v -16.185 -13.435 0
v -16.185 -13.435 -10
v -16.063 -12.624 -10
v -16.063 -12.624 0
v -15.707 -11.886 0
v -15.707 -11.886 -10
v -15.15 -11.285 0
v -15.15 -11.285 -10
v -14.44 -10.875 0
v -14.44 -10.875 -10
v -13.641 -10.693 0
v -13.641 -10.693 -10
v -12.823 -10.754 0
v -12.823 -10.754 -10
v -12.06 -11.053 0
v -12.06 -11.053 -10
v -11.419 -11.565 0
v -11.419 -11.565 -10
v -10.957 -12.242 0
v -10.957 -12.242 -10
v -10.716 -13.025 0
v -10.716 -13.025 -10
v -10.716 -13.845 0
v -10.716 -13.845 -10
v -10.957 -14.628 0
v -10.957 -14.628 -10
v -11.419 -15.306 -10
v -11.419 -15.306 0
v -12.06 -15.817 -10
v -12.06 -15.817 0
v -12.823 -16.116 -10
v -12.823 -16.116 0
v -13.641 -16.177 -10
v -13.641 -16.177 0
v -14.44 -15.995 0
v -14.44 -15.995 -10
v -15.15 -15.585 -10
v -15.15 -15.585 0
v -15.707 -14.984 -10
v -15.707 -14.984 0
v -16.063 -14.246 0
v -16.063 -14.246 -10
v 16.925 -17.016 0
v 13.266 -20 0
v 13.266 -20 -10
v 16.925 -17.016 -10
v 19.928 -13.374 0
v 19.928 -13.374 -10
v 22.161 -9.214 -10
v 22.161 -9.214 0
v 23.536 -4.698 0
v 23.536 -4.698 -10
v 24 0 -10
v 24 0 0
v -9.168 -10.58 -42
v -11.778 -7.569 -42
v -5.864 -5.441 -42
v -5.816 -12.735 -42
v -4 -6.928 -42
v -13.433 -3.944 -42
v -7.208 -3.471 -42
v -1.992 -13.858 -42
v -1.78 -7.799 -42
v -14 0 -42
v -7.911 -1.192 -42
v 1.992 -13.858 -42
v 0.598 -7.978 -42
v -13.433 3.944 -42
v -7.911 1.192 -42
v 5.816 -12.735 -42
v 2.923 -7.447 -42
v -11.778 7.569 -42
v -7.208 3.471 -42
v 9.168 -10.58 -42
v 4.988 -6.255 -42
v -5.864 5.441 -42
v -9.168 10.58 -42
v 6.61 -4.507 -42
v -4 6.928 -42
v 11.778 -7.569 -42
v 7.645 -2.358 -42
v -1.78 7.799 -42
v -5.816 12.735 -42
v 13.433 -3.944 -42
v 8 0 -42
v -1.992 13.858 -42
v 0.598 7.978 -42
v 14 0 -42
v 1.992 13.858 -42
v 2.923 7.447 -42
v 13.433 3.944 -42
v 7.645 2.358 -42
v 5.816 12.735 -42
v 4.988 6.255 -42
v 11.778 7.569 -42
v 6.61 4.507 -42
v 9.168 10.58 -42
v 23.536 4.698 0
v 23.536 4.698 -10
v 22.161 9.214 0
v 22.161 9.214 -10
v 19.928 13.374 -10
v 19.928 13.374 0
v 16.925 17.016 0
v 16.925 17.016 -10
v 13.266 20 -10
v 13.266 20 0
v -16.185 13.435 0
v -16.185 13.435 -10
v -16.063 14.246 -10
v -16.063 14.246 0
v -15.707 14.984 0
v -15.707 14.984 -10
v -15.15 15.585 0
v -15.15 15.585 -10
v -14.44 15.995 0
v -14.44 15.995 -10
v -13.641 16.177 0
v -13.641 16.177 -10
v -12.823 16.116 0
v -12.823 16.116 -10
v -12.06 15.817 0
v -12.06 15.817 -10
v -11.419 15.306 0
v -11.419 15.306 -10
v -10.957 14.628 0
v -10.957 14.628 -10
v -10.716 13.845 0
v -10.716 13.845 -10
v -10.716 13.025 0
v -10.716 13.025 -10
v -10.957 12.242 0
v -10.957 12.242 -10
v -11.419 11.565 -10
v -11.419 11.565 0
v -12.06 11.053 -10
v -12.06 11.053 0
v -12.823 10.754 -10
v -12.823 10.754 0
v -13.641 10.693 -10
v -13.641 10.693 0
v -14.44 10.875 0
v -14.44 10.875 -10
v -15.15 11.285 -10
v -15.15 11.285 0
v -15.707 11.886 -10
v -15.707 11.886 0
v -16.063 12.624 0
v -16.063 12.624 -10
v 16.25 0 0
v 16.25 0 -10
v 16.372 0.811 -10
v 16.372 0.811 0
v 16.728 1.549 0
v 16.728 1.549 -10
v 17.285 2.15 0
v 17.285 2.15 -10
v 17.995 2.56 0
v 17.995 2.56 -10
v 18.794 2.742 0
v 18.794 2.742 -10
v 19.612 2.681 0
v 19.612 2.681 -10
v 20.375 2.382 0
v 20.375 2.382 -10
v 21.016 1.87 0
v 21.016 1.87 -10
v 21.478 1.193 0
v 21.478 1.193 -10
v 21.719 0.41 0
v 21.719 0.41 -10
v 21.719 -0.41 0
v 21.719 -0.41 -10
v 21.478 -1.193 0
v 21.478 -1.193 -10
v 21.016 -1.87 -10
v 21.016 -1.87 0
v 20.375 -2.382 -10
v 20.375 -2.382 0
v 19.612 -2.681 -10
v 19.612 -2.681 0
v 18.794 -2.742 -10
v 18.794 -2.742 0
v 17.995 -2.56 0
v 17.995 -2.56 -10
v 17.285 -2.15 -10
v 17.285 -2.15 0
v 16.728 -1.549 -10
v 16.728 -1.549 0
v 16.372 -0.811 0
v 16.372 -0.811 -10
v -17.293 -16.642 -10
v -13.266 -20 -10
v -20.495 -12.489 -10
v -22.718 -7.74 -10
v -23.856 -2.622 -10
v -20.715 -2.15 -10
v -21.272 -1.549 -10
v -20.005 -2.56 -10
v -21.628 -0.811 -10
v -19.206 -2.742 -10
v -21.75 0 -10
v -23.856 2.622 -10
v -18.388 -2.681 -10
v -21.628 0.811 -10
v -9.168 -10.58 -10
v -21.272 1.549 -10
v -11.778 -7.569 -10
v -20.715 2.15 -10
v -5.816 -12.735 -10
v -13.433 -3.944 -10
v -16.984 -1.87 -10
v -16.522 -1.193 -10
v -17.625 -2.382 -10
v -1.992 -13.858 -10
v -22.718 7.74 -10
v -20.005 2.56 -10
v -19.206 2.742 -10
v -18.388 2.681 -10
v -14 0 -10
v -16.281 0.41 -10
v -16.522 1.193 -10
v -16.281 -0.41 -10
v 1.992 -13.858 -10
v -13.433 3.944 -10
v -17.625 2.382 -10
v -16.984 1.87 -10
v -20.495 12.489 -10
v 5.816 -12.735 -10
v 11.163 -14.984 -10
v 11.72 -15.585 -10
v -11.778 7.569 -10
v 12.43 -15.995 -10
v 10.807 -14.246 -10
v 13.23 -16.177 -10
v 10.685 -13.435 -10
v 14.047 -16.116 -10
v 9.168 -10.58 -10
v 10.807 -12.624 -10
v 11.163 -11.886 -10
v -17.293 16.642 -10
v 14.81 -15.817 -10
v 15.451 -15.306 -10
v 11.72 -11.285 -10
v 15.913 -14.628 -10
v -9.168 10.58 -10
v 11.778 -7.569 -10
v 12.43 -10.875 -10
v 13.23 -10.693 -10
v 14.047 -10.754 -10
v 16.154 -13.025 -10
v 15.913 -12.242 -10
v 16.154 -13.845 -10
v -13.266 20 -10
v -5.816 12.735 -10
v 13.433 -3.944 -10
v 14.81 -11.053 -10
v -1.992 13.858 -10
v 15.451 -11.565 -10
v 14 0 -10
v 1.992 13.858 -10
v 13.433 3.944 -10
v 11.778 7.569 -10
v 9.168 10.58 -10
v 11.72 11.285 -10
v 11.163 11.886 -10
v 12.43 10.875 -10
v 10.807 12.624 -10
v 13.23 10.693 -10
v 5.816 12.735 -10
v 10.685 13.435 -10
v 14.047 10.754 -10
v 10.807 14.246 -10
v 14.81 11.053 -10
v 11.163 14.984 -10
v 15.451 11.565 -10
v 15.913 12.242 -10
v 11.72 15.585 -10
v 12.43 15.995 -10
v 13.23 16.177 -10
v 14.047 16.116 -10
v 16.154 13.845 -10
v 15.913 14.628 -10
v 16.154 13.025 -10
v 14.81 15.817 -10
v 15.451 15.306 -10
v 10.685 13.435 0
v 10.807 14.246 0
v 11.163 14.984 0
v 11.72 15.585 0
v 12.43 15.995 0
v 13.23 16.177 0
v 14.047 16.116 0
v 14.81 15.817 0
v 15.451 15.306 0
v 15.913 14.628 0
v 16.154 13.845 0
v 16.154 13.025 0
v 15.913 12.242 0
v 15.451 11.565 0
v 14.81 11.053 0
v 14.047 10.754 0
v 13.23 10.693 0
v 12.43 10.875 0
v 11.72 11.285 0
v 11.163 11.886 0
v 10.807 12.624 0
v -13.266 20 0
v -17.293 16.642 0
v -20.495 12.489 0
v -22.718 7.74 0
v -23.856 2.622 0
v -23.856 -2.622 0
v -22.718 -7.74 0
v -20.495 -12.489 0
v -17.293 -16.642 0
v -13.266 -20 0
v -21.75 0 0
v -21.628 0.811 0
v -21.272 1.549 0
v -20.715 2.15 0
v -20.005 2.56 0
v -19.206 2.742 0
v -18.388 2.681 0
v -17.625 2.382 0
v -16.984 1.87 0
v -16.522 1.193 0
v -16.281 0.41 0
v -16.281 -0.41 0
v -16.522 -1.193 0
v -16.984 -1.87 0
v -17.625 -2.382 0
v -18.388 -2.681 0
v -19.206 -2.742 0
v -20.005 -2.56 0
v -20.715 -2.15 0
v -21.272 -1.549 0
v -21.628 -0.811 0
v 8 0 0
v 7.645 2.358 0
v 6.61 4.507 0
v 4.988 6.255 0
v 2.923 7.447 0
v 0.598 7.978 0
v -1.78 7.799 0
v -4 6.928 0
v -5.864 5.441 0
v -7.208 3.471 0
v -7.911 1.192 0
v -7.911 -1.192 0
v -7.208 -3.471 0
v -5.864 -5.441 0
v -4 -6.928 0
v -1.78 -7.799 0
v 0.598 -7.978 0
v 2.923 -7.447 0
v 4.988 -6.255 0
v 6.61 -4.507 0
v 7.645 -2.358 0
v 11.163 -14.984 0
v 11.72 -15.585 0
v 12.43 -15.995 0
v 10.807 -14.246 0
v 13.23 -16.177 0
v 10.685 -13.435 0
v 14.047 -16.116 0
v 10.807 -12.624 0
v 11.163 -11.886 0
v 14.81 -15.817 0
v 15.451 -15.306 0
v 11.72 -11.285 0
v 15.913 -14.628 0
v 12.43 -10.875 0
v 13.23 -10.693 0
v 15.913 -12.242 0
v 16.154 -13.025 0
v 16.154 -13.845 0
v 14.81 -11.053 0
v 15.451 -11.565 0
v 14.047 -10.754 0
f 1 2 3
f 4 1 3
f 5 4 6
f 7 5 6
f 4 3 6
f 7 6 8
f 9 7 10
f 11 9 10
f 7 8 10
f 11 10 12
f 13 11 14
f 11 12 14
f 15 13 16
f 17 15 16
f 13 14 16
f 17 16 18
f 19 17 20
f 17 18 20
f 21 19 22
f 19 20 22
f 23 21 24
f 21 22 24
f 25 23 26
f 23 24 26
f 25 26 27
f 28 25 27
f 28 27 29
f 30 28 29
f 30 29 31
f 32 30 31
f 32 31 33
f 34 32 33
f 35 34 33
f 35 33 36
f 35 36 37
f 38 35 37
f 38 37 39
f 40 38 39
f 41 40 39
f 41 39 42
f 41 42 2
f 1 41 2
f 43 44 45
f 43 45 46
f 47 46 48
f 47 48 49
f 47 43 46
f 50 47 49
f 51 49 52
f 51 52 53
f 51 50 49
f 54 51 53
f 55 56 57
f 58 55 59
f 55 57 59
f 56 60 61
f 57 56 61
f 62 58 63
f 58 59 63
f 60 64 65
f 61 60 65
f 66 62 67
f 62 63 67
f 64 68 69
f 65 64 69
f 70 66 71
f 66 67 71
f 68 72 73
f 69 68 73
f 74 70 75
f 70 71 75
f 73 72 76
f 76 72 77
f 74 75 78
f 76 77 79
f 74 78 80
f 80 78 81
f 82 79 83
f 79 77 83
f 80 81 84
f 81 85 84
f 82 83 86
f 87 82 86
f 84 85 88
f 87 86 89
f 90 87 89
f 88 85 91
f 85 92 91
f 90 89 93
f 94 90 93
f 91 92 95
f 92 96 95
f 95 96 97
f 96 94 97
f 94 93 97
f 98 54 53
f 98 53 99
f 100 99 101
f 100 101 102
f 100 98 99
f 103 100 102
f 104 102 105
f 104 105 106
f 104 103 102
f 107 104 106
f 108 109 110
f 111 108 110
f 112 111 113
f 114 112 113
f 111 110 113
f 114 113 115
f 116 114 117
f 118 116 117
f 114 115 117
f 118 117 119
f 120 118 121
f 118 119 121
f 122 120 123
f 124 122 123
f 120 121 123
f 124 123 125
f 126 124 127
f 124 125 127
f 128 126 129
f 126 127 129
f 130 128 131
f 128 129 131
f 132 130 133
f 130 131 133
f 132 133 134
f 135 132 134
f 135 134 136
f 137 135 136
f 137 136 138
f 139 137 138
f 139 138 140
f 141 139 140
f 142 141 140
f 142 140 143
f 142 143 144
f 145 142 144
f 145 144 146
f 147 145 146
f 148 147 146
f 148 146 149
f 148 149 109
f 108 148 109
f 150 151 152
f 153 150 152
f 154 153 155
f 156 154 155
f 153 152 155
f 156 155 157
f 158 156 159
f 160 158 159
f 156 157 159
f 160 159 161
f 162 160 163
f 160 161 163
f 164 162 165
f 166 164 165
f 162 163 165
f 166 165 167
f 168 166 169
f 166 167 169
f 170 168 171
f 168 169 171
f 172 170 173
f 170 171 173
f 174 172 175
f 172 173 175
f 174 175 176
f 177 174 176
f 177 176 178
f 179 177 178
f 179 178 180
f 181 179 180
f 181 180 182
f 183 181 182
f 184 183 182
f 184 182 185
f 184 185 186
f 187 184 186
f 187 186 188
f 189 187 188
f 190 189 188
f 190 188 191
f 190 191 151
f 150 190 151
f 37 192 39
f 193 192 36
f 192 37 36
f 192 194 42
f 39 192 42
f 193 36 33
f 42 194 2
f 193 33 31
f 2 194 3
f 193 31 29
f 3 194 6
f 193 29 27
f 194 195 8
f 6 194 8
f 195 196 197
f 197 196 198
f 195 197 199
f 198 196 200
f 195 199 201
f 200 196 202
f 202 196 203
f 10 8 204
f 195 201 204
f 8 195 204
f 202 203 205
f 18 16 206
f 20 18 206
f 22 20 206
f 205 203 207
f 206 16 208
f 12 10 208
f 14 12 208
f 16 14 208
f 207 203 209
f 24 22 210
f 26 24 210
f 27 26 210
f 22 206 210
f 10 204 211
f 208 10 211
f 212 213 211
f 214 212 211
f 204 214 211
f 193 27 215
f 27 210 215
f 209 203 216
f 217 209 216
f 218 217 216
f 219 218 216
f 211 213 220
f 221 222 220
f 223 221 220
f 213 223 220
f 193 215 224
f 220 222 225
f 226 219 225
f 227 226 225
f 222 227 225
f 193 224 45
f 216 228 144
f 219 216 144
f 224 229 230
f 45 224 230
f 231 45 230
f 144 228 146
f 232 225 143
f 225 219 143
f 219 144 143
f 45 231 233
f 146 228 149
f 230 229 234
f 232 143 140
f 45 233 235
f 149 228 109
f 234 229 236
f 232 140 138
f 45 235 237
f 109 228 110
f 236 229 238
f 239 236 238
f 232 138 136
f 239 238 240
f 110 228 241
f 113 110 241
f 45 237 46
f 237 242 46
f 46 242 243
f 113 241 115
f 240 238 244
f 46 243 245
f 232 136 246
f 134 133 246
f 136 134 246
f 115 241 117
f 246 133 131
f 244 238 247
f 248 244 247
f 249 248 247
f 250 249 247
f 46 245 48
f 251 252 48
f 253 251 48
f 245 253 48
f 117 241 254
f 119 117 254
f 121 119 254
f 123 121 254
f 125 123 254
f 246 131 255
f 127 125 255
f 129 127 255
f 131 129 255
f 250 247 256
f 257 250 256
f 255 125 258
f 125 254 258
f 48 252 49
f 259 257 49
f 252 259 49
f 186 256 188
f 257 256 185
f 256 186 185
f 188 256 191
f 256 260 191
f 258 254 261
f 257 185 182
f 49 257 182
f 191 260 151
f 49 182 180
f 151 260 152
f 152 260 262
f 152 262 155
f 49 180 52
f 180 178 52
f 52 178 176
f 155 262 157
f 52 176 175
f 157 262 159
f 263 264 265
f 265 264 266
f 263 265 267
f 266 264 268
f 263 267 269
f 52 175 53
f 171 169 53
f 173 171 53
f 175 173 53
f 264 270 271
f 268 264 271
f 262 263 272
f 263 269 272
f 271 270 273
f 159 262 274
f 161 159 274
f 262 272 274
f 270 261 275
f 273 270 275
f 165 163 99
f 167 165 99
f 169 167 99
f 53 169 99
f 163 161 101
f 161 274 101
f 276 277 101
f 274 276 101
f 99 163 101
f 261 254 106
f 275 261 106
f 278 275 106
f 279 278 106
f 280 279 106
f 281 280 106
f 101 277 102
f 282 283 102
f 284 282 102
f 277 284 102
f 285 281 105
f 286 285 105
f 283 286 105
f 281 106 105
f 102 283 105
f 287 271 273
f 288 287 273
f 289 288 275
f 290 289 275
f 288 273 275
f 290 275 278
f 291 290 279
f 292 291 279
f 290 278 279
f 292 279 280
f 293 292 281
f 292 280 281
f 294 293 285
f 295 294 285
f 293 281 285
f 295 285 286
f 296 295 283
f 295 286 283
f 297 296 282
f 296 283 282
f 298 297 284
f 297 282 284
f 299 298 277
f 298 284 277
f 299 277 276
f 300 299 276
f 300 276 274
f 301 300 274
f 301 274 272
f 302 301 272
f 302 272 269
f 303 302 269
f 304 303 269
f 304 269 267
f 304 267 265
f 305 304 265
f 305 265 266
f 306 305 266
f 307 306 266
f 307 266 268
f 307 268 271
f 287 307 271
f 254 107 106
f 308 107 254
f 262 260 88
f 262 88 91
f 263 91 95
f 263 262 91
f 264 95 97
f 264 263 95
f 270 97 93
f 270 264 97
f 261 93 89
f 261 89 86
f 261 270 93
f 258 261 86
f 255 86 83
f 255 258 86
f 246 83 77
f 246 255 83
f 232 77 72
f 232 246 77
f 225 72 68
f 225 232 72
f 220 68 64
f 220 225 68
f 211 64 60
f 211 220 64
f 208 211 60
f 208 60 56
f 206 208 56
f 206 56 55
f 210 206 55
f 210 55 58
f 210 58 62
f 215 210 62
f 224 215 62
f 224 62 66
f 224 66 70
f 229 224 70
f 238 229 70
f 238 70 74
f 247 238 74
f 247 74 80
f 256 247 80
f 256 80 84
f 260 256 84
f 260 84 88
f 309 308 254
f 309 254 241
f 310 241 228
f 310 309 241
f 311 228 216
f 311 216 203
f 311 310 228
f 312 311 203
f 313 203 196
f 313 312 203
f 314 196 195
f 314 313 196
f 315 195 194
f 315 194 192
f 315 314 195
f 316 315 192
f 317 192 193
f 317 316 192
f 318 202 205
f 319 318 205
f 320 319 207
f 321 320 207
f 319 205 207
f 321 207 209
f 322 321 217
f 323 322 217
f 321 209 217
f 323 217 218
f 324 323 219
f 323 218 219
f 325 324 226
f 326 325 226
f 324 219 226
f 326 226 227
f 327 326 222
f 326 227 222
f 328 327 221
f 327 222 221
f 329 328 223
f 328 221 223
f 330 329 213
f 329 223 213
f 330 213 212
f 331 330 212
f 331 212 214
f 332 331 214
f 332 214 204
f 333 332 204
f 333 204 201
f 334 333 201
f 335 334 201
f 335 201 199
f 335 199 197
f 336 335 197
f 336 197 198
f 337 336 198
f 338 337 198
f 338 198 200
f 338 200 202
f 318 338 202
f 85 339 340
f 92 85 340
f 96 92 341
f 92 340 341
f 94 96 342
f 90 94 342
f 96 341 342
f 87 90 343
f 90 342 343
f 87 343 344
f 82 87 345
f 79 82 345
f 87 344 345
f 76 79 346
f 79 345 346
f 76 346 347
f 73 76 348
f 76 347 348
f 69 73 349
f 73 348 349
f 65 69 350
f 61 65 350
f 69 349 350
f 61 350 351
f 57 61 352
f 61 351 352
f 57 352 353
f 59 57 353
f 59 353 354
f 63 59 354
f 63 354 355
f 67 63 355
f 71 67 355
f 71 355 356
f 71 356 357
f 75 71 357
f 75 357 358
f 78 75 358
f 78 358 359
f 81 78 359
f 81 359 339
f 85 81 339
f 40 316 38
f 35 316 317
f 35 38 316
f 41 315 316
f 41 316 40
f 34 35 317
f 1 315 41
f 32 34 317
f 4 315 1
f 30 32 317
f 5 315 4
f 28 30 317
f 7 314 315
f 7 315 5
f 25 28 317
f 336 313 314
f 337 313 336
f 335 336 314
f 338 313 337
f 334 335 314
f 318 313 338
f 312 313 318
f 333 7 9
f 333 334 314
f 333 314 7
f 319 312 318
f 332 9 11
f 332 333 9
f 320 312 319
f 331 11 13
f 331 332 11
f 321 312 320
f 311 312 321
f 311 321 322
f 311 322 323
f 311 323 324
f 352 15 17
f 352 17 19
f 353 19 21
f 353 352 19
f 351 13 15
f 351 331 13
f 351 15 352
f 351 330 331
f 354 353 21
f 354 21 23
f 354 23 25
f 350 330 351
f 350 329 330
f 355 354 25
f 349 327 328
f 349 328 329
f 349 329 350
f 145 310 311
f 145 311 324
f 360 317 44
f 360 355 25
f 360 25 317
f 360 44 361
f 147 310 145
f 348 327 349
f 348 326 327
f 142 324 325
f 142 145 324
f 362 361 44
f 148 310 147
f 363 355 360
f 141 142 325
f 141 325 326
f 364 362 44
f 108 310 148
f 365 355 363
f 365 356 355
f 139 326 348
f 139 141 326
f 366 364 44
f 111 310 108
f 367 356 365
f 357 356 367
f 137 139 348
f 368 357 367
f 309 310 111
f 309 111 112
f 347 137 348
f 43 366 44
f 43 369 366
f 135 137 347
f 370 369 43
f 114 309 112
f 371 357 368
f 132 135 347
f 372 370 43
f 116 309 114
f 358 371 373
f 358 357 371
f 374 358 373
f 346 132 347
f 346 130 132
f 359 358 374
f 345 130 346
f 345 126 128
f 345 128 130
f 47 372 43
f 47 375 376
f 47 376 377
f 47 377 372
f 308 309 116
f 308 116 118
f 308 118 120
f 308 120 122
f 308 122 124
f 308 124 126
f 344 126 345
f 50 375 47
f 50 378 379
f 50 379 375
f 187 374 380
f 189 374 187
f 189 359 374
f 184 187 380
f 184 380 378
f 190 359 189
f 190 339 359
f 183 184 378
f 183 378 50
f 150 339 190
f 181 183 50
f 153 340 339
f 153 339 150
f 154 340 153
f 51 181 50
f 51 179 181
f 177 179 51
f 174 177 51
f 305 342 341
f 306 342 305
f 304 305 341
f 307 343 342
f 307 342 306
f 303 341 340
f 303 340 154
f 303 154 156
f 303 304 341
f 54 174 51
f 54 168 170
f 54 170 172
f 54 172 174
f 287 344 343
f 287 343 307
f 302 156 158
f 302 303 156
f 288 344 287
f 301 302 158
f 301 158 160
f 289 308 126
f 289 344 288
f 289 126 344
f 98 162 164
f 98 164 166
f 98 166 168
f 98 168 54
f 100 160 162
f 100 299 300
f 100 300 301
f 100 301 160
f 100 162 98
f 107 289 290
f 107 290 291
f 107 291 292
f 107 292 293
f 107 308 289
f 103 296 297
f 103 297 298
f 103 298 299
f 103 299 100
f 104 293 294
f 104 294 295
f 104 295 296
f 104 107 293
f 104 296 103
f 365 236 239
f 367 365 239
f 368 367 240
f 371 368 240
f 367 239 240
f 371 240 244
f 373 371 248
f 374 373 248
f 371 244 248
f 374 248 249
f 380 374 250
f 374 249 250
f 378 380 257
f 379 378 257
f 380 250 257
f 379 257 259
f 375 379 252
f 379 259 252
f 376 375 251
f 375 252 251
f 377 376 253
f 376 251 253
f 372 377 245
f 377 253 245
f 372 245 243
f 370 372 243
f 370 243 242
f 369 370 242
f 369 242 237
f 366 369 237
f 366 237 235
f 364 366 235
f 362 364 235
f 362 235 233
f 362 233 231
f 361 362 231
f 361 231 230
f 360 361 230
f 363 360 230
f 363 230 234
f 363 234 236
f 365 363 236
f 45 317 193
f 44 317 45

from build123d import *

# Parameters (mm, degrees)
SKETCH1_R            = 14
SKETCH1_R_2          = 8
BOSS_EXTRUDE1_DEPTH  = 42
SKETCH2_R            = 8
BOSS_EXTRUDE2_DEPTH  = 10
M5_CLEARANCE_HOLE1_D = 5.5


with BuildPart() as part:
    # Sketch1 → Boss-Extrude1 (new body)
    with BuildSketch(Plane.XY):
        Circle(SKETCH1_R)
        Circle(SKETCH1_R_2, mode=Mode.SUBTRACT)
    extrude(amount=-BOSS_EXTRUDE1_DEPTH)

    # Sketch2 → Boss-Extrude2 (add)
    with BuildSketch(Plane.XY):
        with BuildLine():
            Line((13.266499161, 20), (-13.266499161, 20))
            ThreePointArc((-13.266499161, 20), (-24, 0), (-13.266499161, -20))
            Line((-13.266499161, -20), (13.266499161, -20))
            ThreePointArc((13.266499161, -20), (21.147056295, -11.349097324), (24, 0))
            ThreePointArc((24, 0), (21.147056295, 11.349097324), (13.266499161, 20))
        make_face()
        Circle(SKETCH2_R, mode=Mode.SUBTRACT)
    extrude(amount=-BOSS_EXTRUDE2_DEPTH)

    # M5 Clearance Hole1 (through all)
    with Locations(Plane.XY):
        with Locations((-19, 0), (-13.435028843, 13.435028843), (13.435028843, -13.435028843), (0, 0), (13.435028843, 13.435028843), (-13.435028843, -13.435028843), (19, 0)):
            Hole(M5_CLEARANCE_HOLE1_D / 2)


solid = part.part
